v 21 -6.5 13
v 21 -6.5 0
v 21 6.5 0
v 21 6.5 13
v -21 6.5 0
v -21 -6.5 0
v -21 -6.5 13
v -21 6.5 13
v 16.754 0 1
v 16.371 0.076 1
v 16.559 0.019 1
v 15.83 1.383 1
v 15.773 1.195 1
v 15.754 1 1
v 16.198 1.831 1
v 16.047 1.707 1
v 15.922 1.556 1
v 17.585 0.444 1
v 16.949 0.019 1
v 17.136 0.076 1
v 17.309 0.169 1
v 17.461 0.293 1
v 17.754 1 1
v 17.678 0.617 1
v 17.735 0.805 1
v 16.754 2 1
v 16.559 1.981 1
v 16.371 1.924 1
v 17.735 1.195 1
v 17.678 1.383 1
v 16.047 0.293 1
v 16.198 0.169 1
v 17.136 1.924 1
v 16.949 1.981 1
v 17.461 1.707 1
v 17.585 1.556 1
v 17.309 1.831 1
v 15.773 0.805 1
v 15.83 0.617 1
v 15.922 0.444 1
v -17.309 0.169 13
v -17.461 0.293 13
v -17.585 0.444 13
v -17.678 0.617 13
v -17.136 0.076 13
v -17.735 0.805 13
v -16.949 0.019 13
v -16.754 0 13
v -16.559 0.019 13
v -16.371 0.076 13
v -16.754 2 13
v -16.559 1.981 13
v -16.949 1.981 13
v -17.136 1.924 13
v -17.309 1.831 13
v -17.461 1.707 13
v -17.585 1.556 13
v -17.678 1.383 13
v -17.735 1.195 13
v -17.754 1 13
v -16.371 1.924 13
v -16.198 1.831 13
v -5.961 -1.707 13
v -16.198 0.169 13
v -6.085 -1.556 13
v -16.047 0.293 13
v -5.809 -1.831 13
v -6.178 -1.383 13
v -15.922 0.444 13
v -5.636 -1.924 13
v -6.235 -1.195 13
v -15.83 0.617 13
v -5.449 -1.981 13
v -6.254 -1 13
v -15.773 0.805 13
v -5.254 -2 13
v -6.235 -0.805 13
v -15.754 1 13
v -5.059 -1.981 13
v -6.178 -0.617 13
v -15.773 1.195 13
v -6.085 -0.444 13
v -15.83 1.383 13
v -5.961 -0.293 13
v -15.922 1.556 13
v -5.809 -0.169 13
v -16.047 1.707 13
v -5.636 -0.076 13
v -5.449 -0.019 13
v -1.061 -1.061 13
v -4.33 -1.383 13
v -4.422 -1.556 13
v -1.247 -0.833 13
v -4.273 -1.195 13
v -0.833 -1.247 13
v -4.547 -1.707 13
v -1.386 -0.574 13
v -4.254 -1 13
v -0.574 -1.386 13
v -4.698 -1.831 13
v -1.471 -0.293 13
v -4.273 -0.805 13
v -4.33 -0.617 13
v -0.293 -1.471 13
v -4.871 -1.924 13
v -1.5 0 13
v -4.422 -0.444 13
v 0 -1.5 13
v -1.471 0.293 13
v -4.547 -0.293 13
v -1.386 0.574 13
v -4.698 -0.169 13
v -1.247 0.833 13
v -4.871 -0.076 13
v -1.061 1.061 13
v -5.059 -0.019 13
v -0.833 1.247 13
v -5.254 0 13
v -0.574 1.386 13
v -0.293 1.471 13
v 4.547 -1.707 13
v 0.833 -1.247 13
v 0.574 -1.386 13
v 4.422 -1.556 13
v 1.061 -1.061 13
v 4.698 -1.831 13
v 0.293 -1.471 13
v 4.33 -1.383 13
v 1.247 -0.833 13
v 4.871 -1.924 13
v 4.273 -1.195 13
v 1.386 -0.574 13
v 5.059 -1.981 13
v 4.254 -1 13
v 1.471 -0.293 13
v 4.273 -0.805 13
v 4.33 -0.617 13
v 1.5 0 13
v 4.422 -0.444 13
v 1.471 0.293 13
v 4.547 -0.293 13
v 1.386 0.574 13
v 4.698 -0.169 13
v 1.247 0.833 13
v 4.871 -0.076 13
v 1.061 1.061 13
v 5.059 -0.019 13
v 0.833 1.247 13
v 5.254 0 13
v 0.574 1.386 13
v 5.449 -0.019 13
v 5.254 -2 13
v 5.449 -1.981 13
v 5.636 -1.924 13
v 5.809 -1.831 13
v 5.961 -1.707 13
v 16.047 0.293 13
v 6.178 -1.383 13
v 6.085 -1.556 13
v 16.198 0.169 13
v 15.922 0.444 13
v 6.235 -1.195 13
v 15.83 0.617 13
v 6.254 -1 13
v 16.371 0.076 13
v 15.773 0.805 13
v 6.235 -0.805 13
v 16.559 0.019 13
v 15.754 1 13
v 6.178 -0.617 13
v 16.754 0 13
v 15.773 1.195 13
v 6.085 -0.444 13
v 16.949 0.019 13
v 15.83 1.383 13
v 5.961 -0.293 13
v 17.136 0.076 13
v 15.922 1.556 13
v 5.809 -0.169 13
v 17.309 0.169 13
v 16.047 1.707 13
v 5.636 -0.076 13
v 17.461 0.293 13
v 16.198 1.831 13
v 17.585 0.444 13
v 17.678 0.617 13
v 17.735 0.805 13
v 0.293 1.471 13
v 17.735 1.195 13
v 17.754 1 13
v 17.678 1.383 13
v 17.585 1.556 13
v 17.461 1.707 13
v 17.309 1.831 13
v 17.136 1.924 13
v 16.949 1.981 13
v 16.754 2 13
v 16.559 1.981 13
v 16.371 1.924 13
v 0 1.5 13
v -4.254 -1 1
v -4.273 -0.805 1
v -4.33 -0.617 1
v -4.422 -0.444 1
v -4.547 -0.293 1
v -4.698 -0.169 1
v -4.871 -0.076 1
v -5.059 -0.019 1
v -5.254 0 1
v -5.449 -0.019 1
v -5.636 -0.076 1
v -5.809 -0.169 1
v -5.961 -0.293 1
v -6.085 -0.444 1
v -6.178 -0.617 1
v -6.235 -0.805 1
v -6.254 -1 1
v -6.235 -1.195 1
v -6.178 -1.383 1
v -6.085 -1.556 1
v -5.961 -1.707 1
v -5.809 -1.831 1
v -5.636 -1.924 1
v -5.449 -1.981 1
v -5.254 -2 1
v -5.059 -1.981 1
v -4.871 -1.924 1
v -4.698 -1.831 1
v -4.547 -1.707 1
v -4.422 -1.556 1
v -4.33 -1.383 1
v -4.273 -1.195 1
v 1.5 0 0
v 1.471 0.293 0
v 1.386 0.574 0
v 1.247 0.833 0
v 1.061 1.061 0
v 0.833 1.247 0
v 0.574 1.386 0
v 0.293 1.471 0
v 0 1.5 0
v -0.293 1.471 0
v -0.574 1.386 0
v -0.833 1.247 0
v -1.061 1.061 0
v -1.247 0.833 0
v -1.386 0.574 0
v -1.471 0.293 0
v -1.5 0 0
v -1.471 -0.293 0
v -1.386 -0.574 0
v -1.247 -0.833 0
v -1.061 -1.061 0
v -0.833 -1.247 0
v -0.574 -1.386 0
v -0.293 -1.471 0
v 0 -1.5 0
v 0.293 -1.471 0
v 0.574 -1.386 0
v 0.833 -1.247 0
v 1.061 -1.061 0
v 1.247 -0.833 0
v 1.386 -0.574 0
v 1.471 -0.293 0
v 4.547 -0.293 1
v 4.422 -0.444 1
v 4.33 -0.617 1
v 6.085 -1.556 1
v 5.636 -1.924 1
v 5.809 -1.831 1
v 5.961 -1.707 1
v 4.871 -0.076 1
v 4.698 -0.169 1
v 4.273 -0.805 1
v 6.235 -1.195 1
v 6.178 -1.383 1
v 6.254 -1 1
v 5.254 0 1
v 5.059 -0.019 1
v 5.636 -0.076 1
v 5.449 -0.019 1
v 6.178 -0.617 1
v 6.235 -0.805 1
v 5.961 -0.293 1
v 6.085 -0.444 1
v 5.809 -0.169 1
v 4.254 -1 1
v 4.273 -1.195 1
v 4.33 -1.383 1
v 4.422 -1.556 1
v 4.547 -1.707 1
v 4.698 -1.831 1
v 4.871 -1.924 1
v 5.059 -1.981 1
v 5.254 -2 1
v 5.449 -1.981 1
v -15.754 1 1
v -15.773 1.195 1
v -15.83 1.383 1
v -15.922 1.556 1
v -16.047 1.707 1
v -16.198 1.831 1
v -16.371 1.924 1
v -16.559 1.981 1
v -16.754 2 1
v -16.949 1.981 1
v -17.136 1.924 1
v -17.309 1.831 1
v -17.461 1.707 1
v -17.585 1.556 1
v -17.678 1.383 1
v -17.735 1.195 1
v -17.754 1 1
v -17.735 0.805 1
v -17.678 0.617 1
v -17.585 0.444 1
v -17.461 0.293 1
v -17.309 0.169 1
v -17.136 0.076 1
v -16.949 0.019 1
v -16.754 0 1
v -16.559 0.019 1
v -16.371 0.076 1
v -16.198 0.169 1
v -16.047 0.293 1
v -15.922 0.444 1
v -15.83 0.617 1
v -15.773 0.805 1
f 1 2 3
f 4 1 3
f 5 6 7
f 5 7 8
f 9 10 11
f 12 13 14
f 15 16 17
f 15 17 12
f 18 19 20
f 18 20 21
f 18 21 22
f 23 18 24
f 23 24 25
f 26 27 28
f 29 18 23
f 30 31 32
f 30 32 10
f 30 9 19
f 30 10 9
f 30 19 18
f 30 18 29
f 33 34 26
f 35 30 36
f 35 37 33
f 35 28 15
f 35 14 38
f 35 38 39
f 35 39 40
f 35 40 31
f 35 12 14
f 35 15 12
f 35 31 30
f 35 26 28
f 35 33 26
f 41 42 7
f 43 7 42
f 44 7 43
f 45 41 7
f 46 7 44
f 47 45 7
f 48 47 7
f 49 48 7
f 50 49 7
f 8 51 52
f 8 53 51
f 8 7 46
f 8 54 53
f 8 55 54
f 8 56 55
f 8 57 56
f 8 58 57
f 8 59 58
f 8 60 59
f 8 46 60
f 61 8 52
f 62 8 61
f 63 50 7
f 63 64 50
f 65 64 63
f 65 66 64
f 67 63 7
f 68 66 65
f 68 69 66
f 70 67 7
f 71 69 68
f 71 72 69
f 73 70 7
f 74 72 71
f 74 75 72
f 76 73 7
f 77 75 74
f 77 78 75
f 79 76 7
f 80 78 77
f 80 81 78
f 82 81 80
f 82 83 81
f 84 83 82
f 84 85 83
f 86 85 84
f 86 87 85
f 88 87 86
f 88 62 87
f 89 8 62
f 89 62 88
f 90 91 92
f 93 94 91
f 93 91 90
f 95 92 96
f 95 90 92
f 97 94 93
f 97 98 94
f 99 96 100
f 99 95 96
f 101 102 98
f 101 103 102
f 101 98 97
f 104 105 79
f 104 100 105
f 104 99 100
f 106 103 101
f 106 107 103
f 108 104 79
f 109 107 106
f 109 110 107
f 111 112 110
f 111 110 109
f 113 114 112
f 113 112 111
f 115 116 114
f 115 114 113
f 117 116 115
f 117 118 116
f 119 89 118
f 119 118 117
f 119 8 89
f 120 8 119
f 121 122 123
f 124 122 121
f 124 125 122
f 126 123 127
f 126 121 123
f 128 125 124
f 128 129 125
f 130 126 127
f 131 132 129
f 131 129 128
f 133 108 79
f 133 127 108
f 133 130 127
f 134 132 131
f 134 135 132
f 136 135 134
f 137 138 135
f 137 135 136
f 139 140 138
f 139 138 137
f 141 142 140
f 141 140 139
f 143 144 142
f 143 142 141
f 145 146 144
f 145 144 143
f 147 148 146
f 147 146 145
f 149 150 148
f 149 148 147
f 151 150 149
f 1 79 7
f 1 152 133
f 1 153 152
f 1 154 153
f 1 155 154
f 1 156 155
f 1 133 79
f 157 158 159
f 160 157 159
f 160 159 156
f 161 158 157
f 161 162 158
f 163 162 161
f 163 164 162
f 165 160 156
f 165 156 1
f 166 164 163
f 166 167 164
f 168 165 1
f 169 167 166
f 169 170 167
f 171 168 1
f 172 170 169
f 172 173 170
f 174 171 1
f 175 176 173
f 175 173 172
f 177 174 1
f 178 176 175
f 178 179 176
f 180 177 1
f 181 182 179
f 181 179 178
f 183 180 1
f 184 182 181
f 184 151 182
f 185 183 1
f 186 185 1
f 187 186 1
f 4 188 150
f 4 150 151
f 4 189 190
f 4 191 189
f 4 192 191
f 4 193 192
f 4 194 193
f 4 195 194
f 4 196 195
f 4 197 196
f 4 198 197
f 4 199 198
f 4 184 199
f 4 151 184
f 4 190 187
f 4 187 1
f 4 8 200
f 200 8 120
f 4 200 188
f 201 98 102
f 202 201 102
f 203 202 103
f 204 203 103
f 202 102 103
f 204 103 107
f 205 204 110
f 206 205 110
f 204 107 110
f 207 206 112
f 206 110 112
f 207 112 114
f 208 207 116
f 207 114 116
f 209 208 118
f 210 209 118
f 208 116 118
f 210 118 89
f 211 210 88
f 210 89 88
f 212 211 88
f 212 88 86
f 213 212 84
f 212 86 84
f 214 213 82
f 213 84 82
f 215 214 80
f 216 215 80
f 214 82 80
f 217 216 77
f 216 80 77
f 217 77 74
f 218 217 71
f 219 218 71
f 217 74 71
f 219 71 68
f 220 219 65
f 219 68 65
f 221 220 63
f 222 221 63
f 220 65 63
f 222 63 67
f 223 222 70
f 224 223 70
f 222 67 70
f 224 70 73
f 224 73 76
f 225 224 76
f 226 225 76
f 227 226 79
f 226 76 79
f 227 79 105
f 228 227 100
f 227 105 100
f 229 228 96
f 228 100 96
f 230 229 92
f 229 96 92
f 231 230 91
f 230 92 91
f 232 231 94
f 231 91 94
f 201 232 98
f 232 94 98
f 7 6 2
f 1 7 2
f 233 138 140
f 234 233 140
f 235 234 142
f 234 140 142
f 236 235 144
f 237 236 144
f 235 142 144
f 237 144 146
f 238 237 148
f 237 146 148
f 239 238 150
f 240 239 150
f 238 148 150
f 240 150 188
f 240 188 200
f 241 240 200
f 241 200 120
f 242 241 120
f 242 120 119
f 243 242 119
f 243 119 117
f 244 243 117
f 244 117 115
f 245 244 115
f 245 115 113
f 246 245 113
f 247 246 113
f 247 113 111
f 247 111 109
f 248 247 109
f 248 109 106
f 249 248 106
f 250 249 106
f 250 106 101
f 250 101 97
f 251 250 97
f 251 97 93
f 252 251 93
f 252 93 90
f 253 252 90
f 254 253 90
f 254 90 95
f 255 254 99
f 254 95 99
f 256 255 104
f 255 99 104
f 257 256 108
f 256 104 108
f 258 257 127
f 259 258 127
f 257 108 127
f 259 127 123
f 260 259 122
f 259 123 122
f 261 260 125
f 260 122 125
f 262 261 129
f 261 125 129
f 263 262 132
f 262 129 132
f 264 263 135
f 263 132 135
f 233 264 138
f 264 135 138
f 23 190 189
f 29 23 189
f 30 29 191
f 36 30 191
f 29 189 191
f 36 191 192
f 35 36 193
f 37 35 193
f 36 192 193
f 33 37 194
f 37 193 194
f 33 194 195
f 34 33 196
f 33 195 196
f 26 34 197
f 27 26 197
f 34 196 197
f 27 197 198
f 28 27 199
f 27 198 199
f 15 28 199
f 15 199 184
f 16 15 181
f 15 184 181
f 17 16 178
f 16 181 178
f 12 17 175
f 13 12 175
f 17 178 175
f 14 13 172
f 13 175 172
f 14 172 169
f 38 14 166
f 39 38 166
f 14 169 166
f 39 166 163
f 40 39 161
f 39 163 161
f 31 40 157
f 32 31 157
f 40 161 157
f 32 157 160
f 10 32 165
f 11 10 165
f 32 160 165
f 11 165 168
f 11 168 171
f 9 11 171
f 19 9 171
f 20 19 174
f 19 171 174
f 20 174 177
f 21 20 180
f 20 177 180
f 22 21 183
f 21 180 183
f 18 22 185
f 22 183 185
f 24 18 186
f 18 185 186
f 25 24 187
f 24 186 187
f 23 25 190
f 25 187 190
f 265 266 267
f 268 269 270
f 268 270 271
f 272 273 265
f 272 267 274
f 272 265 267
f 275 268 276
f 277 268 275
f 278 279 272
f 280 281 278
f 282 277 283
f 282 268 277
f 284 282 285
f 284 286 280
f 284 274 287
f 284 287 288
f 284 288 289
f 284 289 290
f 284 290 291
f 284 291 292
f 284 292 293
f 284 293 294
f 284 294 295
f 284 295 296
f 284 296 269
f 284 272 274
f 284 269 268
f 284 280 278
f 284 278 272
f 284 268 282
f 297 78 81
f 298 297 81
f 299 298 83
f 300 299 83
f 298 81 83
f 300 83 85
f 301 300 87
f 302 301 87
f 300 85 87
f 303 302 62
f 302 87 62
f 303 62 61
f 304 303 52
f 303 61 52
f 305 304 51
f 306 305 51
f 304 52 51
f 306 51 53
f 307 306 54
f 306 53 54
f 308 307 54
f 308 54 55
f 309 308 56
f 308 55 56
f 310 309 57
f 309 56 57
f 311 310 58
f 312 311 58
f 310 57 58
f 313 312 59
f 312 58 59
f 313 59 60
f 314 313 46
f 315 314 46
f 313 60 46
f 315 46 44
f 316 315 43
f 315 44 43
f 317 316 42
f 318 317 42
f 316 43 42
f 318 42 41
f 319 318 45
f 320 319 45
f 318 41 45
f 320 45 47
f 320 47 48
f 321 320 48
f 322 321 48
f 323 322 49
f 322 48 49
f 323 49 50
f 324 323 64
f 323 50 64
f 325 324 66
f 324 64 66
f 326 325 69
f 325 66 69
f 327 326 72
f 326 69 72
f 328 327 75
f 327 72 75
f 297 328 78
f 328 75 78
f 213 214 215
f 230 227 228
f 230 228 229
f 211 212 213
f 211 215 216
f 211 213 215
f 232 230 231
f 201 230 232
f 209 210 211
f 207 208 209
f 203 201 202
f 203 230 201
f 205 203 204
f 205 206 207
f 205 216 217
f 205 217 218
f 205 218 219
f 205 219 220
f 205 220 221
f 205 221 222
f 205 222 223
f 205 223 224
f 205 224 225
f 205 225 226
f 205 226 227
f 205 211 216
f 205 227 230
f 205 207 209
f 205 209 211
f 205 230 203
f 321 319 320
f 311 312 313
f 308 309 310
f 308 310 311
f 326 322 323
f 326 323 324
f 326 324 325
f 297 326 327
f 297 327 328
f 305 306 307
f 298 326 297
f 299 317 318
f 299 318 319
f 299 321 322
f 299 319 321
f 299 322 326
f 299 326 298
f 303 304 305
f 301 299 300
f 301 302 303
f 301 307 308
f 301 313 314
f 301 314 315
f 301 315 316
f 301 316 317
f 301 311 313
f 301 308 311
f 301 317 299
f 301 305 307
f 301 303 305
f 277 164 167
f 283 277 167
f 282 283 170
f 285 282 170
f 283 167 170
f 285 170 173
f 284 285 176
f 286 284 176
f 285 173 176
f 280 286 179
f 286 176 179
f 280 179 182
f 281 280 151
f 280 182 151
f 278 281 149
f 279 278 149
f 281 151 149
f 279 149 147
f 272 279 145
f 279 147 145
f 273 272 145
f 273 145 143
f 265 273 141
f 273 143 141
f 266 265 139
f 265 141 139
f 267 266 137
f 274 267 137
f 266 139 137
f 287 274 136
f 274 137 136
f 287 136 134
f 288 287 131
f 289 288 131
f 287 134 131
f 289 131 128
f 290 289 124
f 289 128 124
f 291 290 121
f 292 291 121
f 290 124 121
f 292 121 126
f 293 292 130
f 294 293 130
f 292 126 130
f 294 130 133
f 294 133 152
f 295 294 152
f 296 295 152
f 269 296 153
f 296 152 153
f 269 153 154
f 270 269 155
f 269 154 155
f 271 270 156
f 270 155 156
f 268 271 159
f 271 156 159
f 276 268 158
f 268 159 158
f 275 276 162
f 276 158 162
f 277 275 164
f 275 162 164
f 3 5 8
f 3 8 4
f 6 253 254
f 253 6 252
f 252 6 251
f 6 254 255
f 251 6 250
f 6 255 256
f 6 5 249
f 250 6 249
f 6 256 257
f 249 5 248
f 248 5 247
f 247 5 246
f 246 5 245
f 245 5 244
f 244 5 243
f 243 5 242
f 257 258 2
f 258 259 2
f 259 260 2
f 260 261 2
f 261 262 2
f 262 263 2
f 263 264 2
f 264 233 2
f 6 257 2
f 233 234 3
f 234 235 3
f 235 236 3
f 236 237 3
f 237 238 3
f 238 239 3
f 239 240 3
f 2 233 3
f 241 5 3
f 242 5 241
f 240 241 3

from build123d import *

# Parameters (mm, degrees)
F0_W     = 42
F0_H     = 13
F1_DEPTH = 13
F2_R     = 1
F3_DEPTH = 12
F4_R     = 1.5
F5_DEPTH = 13.001


with BuildPart() as f1:
    # F0 (on Top) → F1 (new body)
    with BuildSketch(Plane.XY):
        Rectangle(F0_W, F0_H)
    extrude(amount=F1_DEPTH)

    # F2 (on face) → F3 (cut)
    with BuildSketch(Plane.XY.offset(13)):
        with Locations((-16.753747, 1)):
            Circle(F2_R)
        with Locations((-5.253747, -1)):
            Circle(F2_R)
        with Locations((5.253747, -1)):
            Circle(F2_R)
        with Locations((16.753747, 1)):
            Circle(F2_R)
    extrude(amount=-F3_DEPTH, mode=Mode.SUBTRACT)

    # F4 (on face) → F5 (cut, through all)
    with BuildSketch(Plane.XY.offset(13)):
        Circle(F4_R)
    extrude(amount=-F5_DEPTH, mode=Mode.SUBTRACT)


solid = f1.part
